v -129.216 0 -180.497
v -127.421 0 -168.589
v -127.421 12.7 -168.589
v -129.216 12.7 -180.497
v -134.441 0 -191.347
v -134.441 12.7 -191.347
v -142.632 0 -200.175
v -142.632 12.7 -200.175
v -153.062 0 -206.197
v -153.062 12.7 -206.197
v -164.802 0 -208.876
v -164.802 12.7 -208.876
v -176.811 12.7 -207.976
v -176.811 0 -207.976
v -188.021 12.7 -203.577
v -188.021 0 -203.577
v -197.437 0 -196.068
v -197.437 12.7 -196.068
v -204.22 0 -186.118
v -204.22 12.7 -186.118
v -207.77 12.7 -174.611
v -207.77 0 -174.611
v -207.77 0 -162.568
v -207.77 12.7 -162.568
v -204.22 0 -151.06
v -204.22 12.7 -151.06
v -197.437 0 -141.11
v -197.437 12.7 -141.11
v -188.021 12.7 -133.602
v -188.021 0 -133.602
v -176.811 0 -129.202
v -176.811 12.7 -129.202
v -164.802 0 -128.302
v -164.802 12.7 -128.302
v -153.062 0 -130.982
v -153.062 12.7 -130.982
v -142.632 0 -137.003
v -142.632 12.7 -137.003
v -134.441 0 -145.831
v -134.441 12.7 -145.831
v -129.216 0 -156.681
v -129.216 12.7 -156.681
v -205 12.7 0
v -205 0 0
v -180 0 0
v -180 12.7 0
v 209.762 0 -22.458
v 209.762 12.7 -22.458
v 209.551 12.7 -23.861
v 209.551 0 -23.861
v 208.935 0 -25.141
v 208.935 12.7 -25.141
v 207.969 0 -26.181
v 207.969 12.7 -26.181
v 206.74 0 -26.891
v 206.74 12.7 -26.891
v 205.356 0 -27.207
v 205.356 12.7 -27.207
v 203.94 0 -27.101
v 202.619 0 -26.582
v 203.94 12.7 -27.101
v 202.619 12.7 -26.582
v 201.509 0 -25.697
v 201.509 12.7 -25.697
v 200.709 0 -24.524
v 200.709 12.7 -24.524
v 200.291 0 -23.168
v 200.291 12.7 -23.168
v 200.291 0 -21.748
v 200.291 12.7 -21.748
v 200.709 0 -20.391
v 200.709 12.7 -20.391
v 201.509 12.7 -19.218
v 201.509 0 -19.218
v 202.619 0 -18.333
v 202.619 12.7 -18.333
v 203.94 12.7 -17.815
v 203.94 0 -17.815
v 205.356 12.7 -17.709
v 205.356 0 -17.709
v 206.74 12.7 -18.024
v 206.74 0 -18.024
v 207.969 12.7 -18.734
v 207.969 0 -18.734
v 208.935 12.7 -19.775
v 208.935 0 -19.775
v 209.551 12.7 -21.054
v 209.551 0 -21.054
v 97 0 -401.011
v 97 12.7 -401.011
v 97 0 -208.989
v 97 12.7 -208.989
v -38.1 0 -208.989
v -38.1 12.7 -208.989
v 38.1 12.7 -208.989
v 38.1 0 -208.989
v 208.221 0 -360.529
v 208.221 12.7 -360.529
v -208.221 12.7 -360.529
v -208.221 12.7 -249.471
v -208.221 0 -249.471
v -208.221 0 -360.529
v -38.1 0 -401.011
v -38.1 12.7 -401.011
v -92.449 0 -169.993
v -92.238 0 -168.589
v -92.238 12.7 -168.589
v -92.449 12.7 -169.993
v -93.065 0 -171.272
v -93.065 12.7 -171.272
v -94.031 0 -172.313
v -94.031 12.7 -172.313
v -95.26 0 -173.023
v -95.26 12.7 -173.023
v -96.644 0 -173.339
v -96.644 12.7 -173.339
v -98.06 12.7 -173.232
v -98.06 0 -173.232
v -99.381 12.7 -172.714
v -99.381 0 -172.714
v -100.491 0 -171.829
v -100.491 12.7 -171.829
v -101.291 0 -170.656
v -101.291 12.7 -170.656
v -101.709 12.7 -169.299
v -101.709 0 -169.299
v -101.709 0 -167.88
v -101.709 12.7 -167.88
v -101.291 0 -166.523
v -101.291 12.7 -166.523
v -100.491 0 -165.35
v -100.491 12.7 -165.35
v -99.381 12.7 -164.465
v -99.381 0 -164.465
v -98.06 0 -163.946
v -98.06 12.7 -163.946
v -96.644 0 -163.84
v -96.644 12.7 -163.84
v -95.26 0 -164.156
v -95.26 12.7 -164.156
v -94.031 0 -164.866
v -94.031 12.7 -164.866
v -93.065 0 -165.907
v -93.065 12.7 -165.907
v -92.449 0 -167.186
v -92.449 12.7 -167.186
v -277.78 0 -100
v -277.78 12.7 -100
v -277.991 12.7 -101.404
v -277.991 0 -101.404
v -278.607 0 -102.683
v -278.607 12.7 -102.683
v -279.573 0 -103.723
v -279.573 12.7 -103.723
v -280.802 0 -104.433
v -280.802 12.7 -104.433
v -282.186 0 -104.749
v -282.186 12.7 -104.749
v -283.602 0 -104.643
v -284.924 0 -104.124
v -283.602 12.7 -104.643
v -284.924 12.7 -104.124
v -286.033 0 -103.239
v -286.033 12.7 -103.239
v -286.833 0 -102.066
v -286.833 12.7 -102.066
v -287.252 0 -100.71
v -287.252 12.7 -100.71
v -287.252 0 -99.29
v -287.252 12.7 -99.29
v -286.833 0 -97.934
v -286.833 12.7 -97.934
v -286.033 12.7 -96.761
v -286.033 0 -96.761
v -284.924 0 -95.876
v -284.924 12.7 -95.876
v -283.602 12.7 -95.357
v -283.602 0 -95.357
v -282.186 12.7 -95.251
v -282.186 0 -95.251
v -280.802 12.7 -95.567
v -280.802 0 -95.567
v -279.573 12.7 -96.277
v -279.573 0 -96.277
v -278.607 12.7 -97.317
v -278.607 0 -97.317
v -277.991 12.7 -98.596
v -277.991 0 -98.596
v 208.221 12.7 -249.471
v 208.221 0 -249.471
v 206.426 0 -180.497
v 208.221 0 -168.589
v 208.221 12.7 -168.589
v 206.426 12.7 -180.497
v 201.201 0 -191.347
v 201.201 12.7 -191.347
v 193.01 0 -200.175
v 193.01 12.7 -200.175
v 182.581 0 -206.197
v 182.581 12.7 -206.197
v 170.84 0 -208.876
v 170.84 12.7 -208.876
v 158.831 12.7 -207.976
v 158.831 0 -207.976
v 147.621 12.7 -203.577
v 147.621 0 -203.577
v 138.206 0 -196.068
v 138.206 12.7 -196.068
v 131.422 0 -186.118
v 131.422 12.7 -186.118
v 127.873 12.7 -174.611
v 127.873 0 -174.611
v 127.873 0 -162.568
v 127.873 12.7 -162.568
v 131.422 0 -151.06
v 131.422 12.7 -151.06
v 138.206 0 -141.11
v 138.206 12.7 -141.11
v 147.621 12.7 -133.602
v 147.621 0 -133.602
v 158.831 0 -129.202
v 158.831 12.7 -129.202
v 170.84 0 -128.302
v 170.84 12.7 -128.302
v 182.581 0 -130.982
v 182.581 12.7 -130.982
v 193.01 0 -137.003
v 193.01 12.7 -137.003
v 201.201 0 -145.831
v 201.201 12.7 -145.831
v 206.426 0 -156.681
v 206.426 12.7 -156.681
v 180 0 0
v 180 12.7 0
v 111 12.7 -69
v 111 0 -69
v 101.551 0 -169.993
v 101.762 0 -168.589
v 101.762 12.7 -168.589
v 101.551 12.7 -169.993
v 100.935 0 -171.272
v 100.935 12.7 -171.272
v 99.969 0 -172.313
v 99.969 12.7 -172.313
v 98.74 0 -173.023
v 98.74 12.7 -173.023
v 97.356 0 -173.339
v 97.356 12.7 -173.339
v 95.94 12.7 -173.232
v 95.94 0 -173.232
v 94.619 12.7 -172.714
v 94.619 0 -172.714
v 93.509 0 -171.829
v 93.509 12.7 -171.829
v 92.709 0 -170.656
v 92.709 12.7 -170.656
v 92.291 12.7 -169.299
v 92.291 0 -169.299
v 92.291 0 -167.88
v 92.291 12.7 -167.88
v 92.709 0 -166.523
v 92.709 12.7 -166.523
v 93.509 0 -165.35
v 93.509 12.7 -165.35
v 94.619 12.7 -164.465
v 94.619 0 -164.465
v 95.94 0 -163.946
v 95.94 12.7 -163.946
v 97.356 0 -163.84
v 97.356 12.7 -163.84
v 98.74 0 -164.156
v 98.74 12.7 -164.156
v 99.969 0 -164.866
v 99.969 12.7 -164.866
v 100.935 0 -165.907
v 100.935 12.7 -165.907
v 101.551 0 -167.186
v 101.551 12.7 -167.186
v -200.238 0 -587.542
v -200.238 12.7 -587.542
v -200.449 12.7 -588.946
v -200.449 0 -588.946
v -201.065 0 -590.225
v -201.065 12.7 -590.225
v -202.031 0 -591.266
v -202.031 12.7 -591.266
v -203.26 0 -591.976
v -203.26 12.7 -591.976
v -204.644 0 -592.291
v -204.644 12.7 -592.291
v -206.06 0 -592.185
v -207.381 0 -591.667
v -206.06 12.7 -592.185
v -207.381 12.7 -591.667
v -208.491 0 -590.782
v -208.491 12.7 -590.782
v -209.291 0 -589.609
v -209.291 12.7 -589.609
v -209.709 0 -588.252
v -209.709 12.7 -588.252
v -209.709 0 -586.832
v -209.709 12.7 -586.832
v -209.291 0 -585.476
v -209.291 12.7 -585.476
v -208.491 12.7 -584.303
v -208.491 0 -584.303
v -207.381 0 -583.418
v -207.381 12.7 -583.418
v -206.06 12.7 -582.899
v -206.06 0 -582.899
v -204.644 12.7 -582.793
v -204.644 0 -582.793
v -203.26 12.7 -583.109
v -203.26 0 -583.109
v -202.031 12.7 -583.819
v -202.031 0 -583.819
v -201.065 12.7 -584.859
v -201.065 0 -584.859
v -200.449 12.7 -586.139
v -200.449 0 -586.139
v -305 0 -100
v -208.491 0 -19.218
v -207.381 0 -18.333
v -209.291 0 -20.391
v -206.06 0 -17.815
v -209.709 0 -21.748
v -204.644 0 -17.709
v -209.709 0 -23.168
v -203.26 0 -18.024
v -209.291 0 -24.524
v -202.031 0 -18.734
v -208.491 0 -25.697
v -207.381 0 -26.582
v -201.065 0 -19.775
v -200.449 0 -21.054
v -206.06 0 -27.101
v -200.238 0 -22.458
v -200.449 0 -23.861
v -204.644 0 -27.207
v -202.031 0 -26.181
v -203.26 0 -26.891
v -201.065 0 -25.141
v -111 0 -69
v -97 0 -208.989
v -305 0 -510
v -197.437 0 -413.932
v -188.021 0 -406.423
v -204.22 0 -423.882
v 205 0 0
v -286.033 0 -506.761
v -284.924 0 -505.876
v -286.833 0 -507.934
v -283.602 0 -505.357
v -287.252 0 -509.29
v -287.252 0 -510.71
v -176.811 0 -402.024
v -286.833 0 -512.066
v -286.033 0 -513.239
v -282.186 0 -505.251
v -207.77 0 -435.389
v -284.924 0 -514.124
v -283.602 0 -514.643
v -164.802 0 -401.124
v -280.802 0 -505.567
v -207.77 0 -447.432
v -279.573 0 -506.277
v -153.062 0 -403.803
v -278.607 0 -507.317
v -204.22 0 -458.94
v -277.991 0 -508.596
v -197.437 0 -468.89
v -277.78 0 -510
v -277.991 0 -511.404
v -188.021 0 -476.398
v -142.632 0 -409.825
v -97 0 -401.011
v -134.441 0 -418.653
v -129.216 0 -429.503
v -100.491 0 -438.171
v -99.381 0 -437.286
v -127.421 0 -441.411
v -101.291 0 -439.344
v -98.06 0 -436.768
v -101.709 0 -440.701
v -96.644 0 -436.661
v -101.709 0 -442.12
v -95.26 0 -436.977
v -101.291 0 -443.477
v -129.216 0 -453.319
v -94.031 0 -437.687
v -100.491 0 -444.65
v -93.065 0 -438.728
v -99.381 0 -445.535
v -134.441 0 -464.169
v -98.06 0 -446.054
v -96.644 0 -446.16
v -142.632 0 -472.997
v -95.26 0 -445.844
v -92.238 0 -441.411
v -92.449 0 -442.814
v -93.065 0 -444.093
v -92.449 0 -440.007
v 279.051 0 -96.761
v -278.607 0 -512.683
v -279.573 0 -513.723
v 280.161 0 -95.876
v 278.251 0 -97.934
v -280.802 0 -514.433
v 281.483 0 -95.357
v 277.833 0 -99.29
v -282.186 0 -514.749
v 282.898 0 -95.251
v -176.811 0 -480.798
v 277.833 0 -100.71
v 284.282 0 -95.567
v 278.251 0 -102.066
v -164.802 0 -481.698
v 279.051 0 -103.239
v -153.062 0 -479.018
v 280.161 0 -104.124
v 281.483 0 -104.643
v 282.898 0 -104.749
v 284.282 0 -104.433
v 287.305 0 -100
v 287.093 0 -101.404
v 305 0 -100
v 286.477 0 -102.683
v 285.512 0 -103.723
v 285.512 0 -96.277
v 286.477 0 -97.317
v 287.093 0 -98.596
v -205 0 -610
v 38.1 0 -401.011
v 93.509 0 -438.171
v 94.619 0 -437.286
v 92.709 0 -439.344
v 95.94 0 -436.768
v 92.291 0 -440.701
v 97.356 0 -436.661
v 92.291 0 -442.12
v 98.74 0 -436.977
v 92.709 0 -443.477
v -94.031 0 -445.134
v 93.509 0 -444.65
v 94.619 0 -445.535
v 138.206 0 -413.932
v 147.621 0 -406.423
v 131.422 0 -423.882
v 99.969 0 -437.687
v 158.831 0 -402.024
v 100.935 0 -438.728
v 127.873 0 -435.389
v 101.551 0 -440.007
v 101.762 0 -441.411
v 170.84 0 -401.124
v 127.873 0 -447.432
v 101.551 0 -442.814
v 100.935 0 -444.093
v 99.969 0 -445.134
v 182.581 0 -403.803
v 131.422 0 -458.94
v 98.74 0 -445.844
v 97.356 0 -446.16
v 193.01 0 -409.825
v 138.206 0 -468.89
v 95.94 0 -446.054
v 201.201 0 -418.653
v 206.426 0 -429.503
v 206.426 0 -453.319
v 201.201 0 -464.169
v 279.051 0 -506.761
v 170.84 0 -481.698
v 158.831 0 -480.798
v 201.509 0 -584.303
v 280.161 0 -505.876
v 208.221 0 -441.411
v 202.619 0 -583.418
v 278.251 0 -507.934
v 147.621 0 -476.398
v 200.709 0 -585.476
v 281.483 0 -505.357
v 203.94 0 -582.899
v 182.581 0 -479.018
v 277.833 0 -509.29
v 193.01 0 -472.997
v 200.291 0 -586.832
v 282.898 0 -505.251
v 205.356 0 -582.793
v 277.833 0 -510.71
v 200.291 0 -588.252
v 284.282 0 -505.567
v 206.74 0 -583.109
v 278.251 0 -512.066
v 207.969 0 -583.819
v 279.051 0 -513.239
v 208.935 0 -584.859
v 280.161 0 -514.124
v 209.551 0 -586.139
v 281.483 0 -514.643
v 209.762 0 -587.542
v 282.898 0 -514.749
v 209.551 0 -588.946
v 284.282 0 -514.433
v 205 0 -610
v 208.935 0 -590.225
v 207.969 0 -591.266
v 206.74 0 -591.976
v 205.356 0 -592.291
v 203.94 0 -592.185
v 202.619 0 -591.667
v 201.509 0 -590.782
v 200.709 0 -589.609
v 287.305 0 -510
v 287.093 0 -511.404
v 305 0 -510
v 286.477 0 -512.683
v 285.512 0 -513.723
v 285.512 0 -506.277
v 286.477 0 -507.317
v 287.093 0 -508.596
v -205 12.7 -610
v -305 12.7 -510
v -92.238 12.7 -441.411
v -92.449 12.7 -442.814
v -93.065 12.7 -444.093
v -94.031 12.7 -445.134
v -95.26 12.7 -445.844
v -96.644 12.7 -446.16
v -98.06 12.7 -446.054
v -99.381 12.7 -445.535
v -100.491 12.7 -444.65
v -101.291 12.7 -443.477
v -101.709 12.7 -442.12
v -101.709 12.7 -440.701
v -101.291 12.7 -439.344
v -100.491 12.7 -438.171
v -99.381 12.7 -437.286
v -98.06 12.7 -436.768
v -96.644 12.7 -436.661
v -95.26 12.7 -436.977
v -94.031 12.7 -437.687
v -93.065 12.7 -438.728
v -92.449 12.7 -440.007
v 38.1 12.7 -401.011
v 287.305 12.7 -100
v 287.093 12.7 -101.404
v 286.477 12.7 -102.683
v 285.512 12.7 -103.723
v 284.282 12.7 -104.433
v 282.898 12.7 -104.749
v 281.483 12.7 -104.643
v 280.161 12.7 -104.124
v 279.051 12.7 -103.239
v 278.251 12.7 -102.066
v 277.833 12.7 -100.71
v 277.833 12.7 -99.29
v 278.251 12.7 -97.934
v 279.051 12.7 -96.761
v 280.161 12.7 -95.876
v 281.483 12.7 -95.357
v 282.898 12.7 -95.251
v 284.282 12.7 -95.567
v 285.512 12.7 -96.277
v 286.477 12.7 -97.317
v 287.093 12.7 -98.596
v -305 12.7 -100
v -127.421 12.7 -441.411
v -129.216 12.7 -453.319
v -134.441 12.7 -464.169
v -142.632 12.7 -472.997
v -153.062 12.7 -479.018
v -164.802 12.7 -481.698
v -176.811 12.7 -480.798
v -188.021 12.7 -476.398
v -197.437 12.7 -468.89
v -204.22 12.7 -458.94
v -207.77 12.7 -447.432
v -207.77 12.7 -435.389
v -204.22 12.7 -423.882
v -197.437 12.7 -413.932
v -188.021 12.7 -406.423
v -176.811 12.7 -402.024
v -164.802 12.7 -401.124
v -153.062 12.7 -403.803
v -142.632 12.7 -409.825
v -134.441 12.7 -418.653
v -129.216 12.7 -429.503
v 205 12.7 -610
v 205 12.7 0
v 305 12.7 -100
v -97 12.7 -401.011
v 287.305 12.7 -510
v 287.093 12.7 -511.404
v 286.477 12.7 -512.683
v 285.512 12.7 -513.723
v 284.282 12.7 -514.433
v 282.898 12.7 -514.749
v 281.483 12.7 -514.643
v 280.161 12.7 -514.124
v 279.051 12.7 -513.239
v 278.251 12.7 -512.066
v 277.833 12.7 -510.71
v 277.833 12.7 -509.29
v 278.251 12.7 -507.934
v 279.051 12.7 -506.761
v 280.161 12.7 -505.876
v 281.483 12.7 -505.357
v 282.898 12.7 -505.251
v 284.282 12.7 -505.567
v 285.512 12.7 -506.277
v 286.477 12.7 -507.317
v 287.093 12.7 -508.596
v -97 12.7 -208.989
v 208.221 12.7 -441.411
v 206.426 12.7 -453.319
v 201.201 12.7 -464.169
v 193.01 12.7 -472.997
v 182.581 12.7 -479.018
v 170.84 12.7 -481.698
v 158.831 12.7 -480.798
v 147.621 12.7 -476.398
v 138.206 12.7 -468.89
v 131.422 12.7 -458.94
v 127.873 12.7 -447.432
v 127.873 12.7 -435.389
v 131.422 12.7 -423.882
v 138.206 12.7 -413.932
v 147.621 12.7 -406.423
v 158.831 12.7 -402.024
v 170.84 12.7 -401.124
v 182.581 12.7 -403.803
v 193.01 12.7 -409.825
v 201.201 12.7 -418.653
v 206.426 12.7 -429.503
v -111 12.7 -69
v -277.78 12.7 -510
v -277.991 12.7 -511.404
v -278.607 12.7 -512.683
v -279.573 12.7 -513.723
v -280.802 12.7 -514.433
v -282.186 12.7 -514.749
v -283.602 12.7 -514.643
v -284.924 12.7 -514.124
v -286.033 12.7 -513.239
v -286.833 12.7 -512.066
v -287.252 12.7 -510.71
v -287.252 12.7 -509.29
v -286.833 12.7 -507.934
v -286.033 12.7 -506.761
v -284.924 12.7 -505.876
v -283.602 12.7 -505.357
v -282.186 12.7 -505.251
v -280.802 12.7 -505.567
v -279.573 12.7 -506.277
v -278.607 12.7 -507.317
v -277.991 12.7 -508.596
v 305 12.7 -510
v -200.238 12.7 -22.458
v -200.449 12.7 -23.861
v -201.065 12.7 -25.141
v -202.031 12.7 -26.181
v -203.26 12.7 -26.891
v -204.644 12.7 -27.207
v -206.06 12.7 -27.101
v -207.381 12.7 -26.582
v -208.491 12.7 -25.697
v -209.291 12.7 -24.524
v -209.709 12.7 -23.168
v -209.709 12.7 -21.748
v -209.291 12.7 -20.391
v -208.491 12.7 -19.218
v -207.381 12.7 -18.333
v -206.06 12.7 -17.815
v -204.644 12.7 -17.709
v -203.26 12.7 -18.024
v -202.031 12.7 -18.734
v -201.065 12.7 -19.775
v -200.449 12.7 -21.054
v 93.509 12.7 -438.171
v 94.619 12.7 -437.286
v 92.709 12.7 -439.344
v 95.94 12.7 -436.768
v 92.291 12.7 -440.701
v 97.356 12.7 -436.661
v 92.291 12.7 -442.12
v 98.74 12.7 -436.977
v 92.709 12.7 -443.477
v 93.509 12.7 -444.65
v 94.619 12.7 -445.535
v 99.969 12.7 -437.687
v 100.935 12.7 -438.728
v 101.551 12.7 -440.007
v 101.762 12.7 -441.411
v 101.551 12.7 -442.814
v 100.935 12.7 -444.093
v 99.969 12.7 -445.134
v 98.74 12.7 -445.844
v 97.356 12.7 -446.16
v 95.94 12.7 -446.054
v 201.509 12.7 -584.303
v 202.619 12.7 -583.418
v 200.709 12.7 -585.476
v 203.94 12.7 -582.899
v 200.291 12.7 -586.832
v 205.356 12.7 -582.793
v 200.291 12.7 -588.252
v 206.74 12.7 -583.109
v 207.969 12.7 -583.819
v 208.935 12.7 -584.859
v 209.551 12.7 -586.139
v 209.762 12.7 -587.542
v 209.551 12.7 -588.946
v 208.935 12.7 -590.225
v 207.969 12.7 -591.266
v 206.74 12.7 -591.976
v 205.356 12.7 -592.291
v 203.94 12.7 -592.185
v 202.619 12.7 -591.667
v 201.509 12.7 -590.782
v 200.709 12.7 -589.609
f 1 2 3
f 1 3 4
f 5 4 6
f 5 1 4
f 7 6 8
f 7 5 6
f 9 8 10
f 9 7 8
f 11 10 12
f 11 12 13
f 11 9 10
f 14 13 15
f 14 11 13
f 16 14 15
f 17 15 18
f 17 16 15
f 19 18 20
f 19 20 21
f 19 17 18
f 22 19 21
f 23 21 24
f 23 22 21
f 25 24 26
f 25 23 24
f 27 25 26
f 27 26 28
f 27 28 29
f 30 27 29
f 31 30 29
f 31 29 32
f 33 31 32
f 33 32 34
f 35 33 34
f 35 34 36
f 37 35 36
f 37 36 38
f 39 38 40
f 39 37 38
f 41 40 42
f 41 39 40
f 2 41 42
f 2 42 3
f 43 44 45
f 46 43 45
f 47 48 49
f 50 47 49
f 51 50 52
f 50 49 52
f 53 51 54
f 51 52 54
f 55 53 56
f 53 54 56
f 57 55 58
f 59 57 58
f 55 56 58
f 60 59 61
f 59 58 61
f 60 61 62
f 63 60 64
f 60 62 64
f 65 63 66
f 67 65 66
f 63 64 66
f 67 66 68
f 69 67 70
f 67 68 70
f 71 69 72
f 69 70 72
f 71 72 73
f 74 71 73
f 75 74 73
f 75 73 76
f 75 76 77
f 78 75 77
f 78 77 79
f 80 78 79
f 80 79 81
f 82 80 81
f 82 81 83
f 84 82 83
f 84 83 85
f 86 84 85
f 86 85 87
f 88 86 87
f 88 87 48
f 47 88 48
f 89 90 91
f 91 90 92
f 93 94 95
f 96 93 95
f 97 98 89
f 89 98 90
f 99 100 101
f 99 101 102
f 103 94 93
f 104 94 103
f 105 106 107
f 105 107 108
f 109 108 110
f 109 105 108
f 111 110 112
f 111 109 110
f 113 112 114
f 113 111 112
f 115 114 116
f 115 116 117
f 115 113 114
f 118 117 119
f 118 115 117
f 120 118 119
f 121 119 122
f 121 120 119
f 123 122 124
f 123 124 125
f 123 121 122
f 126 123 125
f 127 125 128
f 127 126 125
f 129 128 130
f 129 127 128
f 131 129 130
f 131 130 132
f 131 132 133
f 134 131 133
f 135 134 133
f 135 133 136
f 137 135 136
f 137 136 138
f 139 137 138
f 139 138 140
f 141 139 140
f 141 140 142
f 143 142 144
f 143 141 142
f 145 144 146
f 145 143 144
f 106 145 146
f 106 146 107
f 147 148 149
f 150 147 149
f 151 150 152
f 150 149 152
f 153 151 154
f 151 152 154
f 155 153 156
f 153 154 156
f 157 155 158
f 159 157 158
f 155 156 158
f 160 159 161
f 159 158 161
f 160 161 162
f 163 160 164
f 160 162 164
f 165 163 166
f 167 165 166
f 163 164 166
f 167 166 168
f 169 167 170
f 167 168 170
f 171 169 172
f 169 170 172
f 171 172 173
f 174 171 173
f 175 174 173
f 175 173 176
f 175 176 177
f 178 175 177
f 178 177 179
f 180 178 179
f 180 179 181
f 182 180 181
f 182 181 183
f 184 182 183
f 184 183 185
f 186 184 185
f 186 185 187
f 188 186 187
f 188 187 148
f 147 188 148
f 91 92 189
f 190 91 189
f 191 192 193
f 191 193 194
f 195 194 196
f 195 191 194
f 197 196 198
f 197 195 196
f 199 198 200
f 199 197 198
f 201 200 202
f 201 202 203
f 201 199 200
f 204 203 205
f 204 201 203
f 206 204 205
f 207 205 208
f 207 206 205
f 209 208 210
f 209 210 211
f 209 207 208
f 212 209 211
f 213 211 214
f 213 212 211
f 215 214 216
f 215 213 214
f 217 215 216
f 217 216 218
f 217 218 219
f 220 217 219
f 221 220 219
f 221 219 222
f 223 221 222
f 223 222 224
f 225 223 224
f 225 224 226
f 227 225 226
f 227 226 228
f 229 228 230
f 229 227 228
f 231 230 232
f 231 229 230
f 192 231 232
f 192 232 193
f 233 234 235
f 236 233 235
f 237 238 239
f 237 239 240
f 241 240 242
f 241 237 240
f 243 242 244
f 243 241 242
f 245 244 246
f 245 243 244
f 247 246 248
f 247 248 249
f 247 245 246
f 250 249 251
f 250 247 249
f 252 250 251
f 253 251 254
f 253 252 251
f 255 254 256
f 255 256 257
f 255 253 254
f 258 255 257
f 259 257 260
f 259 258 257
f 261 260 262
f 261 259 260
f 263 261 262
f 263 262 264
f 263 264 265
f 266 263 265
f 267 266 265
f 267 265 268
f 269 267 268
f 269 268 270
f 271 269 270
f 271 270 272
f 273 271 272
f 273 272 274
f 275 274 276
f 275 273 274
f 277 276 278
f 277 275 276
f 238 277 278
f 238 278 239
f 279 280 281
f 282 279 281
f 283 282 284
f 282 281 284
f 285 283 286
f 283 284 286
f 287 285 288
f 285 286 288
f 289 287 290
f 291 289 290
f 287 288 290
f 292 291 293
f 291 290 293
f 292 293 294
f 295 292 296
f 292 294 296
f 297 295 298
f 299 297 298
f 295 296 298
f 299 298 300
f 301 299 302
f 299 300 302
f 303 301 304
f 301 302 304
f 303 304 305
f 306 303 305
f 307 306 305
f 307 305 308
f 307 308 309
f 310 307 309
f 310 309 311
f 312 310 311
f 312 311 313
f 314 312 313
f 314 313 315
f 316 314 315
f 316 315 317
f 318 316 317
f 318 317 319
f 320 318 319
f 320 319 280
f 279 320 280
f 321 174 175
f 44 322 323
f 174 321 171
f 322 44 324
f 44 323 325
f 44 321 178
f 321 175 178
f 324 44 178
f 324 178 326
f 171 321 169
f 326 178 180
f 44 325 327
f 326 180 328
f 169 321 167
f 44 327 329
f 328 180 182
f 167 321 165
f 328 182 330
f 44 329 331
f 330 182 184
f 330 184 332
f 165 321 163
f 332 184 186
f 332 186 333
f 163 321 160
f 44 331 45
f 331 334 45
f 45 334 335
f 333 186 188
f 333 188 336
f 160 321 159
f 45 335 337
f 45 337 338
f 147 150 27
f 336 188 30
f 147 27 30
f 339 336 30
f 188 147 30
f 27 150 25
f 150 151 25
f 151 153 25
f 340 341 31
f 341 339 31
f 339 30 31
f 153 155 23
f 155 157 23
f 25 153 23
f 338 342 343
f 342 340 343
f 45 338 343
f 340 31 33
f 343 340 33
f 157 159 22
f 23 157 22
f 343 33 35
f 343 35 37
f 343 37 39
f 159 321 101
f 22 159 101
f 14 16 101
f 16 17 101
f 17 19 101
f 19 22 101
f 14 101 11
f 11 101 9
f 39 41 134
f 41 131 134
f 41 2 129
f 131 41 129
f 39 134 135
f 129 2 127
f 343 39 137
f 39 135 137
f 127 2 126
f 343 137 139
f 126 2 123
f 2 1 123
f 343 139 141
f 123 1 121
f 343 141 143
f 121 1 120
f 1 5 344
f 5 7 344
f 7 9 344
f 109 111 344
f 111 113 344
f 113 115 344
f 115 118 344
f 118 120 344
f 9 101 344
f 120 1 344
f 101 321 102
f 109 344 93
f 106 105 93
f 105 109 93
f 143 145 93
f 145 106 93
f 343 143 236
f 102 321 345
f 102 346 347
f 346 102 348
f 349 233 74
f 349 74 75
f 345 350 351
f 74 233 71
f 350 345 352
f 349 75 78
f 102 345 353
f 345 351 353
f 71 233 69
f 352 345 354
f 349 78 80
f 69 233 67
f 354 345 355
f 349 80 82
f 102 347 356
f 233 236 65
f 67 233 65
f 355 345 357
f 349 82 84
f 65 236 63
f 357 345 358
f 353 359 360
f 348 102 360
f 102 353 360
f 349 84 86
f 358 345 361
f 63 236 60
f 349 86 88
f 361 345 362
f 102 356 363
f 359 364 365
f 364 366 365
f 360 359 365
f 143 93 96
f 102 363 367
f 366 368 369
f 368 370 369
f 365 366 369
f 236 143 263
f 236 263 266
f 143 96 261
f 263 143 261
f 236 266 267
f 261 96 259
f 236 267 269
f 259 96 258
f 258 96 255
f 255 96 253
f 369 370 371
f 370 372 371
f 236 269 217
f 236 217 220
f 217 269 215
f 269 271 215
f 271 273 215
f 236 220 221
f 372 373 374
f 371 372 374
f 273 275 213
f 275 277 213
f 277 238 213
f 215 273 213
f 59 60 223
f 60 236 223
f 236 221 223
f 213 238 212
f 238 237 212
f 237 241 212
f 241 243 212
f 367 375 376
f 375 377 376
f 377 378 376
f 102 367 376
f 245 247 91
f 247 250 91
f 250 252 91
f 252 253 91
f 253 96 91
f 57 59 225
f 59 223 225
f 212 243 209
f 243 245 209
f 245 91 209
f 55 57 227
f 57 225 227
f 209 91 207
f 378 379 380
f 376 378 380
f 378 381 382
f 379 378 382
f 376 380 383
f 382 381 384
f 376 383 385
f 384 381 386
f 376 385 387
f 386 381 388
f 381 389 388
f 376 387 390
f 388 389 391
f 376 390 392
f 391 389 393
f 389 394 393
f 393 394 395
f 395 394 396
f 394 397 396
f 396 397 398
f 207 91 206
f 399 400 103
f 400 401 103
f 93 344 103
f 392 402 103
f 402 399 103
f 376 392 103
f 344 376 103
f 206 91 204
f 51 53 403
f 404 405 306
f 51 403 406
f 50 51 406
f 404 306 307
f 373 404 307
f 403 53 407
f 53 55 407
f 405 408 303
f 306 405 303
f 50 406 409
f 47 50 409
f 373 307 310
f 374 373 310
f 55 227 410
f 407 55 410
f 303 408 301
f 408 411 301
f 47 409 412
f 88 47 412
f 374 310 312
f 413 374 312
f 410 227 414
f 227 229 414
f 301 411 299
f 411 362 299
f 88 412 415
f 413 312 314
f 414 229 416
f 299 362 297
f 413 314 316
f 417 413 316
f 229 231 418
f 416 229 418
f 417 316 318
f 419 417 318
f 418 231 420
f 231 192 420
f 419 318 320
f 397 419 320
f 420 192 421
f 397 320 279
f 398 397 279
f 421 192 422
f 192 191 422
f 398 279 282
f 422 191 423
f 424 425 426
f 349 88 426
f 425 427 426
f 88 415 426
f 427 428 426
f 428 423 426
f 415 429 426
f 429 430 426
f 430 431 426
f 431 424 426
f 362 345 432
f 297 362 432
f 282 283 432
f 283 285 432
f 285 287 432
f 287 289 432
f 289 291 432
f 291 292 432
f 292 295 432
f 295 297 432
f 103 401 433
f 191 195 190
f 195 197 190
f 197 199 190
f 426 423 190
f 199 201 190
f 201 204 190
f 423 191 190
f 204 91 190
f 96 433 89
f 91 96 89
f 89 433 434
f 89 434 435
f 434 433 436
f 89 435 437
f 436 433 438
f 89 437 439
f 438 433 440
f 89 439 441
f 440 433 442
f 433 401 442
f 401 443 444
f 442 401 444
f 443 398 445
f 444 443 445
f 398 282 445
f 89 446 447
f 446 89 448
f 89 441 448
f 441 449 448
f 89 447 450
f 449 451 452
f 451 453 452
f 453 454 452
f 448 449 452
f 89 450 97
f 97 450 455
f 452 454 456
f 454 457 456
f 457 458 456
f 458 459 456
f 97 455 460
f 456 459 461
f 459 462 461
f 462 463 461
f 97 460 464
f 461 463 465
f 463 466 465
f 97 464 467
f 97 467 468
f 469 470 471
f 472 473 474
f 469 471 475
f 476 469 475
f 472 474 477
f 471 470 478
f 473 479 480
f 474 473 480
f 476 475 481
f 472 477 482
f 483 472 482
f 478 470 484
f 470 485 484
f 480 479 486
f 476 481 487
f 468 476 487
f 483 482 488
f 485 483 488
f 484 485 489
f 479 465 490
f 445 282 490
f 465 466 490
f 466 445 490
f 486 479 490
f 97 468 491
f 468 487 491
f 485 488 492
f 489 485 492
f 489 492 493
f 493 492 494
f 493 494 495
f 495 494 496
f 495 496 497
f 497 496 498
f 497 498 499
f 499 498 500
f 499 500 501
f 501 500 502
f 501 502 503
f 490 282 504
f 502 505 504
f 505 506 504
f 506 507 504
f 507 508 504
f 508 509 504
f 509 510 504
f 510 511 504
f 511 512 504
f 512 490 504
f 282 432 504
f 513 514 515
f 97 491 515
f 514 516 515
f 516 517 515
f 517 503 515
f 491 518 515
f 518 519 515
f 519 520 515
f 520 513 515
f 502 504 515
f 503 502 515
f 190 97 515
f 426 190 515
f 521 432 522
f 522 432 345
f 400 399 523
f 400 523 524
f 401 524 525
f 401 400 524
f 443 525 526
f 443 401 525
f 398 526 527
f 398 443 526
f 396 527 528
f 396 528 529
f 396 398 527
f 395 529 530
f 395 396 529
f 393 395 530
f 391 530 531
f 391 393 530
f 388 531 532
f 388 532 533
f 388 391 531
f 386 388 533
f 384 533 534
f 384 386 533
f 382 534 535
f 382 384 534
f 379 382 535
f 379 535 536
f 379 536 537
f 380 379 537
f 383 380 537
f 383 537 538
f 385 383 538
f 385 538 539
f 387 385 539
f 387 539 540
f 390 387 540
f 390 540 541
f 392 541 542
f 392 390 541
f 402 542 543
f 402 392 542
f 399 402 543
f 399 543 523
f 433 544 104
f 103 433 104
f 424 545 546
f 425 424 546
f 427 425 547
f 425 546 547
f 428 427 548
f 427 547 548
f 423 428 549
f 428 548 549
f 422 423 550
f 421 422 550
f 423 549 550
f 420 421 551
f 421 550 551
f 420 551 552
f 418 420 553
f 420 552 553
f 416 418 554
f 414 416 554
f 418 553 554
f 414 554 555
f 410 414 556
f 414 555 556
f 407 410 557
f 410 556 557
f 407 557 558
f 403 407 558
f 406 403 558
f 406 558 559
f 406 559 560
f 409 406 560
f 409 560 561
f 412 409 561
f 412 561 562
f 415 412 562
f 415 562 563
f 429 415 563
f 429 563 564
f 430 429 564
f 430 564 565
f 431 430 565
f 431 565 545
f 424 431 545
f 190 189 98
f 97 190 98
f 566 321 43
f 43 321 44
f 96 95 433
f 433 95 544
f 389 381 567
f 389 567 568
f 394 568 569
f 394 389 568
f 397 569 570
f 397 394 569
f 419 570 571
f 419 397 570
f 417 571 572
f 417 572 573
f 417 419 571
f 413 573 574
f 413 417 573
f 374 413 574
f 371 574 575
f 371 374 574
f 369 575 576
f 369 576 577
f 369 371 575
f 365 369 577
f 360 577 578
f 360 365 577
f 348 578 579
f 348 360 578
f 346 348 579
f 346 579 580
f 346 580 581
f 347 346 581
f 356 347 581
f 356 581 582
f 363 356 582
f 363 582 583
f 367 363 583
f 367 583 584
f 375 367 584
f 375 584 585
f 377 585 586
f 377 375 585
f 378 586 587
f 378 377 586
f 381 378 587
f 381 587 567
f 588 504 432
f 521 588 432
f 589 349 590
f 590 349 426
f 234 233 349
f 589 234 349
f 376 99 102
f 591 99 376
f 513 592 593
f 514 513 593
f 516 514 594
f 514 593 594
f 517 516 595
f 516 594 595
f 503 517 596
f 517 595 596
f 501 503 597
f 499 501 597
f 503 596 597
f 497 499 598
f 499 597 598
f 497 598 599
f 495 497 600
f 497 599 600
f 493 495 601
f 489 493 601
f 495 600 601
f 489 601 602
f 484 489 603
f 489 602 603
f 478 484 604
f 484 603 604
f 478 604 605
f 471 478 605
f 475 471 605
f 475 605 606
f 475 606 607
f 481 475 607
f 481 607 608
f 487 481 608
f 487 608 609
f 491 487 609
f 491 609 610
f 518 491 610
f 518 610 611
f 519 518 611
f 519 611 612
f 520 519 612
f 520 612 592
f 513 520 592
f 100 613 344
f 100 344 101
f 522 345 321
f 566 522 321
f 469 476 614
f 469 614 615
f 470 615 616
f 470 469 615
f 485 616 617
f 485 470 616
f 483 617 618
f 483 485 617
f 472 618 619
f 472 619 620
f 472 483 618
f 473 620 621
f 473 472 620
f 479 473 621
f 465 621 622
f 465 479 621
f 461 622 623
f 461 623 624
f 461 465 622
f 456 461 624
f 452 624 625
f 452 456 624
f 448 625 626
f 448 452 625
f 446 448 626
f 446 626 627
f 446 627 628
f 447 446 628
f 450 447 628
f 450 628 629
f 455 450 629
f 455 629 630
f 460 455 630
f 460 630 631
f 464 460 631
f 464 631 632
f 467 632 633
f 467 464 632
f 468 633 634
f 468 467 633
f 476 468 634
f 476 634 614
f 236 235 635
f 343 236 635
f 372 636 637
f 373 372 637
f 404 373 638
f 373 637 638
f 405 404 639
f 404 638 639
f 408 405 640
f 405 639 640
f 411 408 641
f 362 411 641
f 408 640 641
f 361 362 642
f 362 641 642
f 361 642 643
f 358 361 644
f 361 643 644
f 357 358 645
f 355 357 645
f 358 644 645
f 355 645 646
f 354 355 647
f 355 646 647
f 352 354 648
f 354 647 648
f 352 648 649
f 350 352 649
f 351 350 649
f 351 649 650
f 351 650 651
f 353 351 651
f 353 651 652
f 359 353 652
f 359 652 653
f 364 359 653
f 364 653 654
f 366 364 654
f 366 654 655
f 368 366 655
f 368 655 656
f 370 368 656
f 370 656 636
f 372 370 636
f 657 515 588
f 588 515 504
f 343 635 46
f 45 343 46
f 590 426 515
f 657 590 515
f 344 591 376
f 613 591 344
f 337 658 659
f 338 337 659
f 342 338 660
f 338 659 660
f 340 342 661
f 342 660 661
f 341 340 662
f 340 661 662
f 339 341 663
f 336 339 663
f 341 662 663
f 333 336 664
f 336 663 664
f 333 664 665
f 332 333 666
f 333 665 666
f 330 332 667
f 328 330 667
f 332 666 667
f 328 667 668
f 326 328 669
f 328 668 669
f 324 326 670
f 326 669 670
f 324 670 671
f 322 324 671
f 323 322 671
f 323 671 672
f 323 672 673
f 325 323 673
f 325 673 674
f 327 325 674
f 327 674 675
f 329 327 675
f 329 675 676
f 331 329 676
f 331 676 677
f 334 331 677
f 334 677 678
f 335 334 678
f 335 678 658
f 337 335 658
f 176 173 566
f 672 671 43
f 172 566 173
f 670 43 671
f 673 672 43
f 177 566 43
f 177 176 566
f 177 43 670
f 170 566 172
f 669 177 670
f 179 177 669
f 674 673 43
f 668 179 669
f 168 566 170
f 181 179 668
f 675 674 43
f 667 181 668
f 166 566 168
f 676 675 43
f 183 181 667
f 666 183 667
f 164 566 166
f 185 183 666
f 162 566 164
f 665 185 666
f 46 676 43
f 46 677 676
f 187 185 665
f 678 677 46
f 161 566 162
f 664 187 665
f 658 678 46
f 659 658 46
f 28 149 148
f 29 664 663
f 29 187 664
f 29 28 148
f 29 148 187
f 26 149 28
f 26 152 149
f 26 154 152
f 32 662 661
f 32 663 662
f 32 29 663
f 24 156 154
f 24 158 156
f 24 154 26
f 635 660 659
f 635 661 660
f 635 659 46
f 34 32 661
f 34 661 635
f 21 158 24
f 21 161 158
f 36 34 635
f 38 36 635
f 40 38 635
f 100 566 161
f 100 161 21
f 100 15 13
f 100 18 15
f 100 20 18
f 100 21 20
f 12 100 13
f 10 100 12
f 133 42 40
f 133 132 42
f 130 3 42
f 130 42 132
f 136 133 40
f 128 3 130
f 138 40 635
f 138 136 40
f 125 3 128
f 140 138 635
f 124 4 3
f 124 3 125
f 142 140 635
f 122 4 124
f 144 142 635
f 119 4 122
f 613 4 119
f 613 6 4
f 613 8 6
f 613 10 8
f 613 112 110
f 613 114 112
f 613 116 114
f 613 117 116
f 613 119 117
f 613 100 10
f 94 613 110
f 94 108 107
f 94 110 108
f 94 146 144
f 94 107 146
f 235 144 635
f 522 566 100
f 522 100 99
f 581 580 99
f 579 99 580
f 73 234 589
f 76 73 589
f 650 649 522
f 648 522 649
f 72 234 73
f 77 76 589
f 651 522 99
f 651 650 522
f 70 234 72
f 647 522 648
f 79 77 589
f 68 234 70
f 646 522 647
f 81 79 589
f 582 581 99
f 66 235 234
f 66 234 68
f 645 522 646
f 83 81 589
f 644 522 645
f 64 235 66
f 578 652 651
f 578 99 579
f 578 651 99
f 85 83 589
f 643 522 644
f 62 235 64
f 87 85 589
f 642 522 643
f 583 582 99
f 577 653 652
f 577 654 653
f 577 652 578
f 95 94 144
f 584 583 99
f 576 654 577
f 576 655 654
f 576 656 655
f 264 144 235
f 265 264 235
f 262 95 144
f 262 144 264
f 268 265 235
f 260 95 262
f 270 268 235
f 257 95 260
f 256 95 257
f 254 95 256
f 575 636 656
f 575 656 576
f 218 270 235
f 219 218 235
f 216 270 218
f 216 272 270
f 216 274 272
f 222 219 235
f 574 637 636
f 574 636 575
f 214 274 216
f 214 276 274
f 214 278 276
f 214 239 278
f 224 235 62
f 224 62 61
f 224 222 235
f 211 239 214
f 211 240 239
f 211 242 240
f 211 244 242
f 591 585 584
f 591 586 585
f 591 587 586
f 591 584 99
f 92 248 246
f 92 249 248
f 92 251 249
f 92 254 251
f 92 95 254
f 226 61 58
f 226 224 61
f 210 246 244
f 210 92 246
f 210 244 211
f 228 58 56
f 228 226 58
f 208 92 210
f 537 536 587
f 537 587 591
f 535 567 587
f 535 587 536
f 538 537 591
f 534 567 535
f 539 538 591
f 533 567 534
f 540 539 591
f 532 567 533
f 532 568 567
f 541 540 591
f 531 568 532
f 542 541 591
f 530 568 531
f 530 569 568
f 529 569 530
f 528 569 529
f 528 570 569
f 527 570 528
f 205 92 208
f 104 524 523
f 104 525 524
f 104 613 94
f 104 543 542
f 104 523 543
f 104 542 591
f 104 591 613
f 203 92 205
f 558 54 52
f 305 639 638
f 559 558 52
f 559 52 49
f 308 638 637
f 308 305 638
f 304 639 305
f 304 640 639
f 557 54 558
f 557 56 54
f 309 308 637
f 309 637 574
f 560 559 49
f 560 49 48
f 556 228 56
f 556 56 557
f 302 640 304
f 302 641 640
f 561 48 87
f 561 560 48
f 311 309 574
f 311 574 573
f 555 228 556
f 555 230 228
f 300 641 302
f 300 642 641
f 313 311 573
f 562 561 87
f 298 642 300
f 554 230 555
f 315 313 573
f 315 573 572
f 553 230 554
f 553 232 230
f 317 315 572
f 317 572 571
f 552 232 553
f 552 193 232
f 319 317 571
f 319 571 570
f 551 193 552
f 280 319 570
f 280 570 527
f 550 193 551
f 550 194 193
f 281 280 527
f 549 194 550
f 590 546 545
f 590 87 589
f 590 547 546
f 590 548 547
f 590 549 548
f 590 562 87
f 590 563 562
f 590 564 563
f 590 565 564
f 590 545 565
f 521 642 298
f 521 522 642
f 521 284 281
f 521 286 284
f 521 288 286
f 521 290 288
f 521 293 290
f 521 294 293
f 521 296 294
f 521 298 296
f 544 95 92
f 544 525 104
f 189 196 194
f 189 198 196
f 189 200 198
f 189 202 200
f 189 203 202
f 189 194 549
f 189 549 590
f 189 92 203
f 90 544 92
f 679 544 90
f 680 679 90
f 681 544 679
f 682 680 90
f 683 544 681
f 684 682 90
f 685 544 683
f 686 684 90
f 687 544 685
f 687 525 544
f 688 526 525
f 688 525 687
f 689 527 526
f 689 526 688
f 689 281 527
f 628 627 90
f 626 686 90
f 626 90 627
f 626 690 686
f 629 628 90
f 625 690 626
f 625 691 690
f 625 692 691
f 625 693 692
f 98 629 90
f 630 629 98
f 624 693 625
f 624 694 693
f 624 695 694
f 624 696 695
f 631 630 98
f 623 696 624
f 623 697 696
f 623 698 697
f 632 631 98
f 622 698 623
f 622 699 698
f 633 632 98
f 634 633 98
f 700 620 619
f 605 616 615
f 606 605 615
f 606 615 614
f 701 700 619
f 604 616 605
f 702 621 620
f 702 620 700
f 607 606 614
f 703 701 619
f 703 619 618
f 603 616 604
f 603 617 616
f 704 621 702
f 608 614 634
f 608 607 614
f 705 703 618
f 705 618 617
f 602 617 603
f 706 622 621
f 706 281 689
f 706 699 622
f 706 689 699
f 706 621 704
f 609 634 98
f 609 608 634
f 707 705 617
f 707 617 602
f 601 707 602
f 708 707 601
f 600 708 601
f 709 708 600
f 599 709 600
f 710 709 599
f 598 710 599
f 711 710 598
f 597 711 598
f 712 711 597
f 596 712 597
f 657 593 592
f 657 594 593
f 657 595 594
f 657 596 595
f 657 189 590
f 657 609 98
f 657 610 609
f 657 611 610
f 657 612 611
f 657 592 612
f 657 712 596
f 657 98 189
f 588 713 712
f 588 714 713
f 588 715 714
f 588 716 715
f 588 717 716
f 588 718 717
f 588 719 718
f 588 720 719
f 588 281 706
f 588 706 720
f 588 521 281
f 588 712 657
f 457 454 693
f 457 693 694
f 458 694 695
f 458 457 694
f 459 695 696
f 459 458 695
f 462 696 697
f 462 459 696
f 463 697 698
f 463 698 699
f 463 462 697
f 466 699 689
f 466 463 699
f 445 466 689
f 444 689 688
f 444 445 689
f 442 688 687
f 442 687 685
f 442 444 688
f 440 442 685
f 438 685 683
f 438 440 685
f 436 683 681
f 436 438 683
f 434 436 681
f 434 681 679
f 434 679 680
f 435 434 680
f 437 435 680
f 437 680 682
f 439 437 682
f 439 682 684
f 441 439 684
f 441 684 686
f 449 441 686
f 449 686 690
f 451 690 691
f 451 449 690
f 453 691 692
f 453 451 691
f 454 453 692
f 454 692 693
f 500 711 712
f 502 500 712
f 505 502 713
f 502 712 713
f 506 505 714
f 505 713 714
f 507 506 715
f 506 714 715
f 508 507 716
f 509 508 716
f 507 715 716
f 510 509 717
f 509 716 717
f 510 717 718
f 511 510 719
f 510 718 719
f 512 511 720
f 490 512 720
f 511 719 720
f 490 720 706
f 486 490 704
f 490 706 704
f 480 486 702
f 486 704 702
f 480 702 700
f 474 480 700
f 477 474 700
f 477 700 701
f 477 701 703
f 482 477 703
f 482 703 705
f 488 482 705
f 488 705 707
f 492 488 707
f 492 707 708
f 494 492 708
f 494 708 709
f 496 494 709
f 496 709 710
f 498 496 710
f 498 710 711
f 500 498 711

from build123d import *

# Parameters (mm, degrees)
SKETCH1_R           = 40.4
SKETCH1_R_2         = 4.7625
BOSS_EXTRUDE1_DEPTH = 12.7
CUT_EXTRUDE1_DEPTH  = 5000
SKETCH3_R           = 4.7625
CUT_EXTRUDE2_DEPTH  = 5000
CUT_EXTRUDE3_DEPTH  = 20
SKETCH5_W           = 38.1
SKETCH5_H           = 192.02128445
CUT_EXTRUDE4_DEPTH  = 78.232


with BuildPart() as part:
    # Sketch1 → Boss-Extrude1 (new body)
    with BuildSketch(Plane(origin=(0, 0, 0), x_dir=(1, 0, 0), z_dir=(0, 1, 0))):
        Polygon((205, 0), (305, 100), (305, 510), (205, 610), (-205, 610), (-305, 510), (-305, 100), (-205, 0), align=None)
        with Locations((-167.82128445, 168.589357775)):
            Circle(SKETCH1_R, mode=Mode.SUBTRACT)
        with Locations((-97, 168.589357775)):
            Circle(SKETCH1_R_2, mode=Mode.SUBTRACT)
        with Locations((97, 168.589357775)):
            Circle(SKETCH1_R_2, mode=Mode.SUBTRACT)
        with Locations((167.82128445, 168.589357775)):
            Circle(SKETCH1_R, mode=Mode.SUBTRACT)
        with Locations((-167.82128445, 441.410642225)):
            Circle(SKETCH1_R, mode=Mode.SUBTRACT)
        with Locations((-97, 441.410642225)):
            Circle(SKETCH1_R_2, mode=Mode.SUBTRACT)
        with Locations((97, 441.410642225)):
            Circle(SKETCH1_R_2, mode=Mode.SUBTRACT)
        with Locations((167.82128445, 441.410642225)):
            Circle(SKETCH1_R, mode=Mode.SUBTRACT)
    extrude(amount=BOSS_EXTRUDE1_DEPTH)

    # Sketch2 → Cut-Extrude1 (cut)
    with BuildSketch(Plane(origin=(0, 12.7, 0), x_dir=(1, 0, 0), z_dir=(0, 1, 0))):
        Polygon((-111, 69), (-180, 0), (180, 0), (111, 69), align=None)
    extrude(amount=-CUT_EXTRUDE1_DEPTH, mode=Mode.SUBTRACT)

    # Sketch3 → Cut-Extrude2 (cut)
    with BuildSketch(Plane(origin=(0, 12.7, 0), x_dir=(1, 0, 0), z_dir=(0, 1, 0))):
        with Locations((-205, 22.45771137)):
            Circle(SKETCH3_R)
        with Locations((205, 22.45771137)):
            Circle(SKETCH3_R)
        with Locations((-282.54228863, 100)):
            Circle(SKETCH3_R)
        with Locations((282.54228863, 100)):
            Circle(SKETCH3_R)
        with Locations((282.54228863, 510)):
            Circle(SKETCH3_R)
        with Locations((205, 587.54228863)):
            Circle(SKETCH3_R)
        with Locations((-205, 587.54228863)):
            Circle(SKETCH3_R)
        with Locations((-282.54228863, 510)):
            Circle(SKETCH3_R)
    extrude(amount=-CUT_EXTRUDE2_DEPTH, mode=Mode.SUBTRACT)

    # Sketch4 → Cut-Extrude3 (cut)
    with BuildSketch(Plane(origin=(0, 12.7, 0), x_dir=(1, 0, 0), z_dir=(0, 1, 0))):
        Polygon((-208.22128445, 360.529405268), (-97, 401.010642225), (-97, 208.989357775), (-208.22128445, 249.470594732), align=None)
        Polygon((208.22128445, 249.470594732), (208.22128445, 360.529405268), (97, 401.010642225), (97, 208.989357775), align=None)
    extrude(amount=-CUT_EXTRUDE3_DEPTH, mode=Mode.SUBTRACT)

    # Sketch5 → Cut-Extrude4 (cut)
    with BuildSketch(Plane(origin=(0, 12.7, 0), x_dir=(1, 0, 0), z_dir=(0, 1, 0))):
        with Locations((-19.05, 305)):
            Rectangle(SKETCH5_W, SKETCH5_H)
        with Locations((19.05, 305)):
            Rectangle(SKETCH5_W, SKETCH5_H)
    extrude(amount=-CUT_EXTRUDE4_DEPTH, mode=Mode.SUBTRACT)


solid = part.part
